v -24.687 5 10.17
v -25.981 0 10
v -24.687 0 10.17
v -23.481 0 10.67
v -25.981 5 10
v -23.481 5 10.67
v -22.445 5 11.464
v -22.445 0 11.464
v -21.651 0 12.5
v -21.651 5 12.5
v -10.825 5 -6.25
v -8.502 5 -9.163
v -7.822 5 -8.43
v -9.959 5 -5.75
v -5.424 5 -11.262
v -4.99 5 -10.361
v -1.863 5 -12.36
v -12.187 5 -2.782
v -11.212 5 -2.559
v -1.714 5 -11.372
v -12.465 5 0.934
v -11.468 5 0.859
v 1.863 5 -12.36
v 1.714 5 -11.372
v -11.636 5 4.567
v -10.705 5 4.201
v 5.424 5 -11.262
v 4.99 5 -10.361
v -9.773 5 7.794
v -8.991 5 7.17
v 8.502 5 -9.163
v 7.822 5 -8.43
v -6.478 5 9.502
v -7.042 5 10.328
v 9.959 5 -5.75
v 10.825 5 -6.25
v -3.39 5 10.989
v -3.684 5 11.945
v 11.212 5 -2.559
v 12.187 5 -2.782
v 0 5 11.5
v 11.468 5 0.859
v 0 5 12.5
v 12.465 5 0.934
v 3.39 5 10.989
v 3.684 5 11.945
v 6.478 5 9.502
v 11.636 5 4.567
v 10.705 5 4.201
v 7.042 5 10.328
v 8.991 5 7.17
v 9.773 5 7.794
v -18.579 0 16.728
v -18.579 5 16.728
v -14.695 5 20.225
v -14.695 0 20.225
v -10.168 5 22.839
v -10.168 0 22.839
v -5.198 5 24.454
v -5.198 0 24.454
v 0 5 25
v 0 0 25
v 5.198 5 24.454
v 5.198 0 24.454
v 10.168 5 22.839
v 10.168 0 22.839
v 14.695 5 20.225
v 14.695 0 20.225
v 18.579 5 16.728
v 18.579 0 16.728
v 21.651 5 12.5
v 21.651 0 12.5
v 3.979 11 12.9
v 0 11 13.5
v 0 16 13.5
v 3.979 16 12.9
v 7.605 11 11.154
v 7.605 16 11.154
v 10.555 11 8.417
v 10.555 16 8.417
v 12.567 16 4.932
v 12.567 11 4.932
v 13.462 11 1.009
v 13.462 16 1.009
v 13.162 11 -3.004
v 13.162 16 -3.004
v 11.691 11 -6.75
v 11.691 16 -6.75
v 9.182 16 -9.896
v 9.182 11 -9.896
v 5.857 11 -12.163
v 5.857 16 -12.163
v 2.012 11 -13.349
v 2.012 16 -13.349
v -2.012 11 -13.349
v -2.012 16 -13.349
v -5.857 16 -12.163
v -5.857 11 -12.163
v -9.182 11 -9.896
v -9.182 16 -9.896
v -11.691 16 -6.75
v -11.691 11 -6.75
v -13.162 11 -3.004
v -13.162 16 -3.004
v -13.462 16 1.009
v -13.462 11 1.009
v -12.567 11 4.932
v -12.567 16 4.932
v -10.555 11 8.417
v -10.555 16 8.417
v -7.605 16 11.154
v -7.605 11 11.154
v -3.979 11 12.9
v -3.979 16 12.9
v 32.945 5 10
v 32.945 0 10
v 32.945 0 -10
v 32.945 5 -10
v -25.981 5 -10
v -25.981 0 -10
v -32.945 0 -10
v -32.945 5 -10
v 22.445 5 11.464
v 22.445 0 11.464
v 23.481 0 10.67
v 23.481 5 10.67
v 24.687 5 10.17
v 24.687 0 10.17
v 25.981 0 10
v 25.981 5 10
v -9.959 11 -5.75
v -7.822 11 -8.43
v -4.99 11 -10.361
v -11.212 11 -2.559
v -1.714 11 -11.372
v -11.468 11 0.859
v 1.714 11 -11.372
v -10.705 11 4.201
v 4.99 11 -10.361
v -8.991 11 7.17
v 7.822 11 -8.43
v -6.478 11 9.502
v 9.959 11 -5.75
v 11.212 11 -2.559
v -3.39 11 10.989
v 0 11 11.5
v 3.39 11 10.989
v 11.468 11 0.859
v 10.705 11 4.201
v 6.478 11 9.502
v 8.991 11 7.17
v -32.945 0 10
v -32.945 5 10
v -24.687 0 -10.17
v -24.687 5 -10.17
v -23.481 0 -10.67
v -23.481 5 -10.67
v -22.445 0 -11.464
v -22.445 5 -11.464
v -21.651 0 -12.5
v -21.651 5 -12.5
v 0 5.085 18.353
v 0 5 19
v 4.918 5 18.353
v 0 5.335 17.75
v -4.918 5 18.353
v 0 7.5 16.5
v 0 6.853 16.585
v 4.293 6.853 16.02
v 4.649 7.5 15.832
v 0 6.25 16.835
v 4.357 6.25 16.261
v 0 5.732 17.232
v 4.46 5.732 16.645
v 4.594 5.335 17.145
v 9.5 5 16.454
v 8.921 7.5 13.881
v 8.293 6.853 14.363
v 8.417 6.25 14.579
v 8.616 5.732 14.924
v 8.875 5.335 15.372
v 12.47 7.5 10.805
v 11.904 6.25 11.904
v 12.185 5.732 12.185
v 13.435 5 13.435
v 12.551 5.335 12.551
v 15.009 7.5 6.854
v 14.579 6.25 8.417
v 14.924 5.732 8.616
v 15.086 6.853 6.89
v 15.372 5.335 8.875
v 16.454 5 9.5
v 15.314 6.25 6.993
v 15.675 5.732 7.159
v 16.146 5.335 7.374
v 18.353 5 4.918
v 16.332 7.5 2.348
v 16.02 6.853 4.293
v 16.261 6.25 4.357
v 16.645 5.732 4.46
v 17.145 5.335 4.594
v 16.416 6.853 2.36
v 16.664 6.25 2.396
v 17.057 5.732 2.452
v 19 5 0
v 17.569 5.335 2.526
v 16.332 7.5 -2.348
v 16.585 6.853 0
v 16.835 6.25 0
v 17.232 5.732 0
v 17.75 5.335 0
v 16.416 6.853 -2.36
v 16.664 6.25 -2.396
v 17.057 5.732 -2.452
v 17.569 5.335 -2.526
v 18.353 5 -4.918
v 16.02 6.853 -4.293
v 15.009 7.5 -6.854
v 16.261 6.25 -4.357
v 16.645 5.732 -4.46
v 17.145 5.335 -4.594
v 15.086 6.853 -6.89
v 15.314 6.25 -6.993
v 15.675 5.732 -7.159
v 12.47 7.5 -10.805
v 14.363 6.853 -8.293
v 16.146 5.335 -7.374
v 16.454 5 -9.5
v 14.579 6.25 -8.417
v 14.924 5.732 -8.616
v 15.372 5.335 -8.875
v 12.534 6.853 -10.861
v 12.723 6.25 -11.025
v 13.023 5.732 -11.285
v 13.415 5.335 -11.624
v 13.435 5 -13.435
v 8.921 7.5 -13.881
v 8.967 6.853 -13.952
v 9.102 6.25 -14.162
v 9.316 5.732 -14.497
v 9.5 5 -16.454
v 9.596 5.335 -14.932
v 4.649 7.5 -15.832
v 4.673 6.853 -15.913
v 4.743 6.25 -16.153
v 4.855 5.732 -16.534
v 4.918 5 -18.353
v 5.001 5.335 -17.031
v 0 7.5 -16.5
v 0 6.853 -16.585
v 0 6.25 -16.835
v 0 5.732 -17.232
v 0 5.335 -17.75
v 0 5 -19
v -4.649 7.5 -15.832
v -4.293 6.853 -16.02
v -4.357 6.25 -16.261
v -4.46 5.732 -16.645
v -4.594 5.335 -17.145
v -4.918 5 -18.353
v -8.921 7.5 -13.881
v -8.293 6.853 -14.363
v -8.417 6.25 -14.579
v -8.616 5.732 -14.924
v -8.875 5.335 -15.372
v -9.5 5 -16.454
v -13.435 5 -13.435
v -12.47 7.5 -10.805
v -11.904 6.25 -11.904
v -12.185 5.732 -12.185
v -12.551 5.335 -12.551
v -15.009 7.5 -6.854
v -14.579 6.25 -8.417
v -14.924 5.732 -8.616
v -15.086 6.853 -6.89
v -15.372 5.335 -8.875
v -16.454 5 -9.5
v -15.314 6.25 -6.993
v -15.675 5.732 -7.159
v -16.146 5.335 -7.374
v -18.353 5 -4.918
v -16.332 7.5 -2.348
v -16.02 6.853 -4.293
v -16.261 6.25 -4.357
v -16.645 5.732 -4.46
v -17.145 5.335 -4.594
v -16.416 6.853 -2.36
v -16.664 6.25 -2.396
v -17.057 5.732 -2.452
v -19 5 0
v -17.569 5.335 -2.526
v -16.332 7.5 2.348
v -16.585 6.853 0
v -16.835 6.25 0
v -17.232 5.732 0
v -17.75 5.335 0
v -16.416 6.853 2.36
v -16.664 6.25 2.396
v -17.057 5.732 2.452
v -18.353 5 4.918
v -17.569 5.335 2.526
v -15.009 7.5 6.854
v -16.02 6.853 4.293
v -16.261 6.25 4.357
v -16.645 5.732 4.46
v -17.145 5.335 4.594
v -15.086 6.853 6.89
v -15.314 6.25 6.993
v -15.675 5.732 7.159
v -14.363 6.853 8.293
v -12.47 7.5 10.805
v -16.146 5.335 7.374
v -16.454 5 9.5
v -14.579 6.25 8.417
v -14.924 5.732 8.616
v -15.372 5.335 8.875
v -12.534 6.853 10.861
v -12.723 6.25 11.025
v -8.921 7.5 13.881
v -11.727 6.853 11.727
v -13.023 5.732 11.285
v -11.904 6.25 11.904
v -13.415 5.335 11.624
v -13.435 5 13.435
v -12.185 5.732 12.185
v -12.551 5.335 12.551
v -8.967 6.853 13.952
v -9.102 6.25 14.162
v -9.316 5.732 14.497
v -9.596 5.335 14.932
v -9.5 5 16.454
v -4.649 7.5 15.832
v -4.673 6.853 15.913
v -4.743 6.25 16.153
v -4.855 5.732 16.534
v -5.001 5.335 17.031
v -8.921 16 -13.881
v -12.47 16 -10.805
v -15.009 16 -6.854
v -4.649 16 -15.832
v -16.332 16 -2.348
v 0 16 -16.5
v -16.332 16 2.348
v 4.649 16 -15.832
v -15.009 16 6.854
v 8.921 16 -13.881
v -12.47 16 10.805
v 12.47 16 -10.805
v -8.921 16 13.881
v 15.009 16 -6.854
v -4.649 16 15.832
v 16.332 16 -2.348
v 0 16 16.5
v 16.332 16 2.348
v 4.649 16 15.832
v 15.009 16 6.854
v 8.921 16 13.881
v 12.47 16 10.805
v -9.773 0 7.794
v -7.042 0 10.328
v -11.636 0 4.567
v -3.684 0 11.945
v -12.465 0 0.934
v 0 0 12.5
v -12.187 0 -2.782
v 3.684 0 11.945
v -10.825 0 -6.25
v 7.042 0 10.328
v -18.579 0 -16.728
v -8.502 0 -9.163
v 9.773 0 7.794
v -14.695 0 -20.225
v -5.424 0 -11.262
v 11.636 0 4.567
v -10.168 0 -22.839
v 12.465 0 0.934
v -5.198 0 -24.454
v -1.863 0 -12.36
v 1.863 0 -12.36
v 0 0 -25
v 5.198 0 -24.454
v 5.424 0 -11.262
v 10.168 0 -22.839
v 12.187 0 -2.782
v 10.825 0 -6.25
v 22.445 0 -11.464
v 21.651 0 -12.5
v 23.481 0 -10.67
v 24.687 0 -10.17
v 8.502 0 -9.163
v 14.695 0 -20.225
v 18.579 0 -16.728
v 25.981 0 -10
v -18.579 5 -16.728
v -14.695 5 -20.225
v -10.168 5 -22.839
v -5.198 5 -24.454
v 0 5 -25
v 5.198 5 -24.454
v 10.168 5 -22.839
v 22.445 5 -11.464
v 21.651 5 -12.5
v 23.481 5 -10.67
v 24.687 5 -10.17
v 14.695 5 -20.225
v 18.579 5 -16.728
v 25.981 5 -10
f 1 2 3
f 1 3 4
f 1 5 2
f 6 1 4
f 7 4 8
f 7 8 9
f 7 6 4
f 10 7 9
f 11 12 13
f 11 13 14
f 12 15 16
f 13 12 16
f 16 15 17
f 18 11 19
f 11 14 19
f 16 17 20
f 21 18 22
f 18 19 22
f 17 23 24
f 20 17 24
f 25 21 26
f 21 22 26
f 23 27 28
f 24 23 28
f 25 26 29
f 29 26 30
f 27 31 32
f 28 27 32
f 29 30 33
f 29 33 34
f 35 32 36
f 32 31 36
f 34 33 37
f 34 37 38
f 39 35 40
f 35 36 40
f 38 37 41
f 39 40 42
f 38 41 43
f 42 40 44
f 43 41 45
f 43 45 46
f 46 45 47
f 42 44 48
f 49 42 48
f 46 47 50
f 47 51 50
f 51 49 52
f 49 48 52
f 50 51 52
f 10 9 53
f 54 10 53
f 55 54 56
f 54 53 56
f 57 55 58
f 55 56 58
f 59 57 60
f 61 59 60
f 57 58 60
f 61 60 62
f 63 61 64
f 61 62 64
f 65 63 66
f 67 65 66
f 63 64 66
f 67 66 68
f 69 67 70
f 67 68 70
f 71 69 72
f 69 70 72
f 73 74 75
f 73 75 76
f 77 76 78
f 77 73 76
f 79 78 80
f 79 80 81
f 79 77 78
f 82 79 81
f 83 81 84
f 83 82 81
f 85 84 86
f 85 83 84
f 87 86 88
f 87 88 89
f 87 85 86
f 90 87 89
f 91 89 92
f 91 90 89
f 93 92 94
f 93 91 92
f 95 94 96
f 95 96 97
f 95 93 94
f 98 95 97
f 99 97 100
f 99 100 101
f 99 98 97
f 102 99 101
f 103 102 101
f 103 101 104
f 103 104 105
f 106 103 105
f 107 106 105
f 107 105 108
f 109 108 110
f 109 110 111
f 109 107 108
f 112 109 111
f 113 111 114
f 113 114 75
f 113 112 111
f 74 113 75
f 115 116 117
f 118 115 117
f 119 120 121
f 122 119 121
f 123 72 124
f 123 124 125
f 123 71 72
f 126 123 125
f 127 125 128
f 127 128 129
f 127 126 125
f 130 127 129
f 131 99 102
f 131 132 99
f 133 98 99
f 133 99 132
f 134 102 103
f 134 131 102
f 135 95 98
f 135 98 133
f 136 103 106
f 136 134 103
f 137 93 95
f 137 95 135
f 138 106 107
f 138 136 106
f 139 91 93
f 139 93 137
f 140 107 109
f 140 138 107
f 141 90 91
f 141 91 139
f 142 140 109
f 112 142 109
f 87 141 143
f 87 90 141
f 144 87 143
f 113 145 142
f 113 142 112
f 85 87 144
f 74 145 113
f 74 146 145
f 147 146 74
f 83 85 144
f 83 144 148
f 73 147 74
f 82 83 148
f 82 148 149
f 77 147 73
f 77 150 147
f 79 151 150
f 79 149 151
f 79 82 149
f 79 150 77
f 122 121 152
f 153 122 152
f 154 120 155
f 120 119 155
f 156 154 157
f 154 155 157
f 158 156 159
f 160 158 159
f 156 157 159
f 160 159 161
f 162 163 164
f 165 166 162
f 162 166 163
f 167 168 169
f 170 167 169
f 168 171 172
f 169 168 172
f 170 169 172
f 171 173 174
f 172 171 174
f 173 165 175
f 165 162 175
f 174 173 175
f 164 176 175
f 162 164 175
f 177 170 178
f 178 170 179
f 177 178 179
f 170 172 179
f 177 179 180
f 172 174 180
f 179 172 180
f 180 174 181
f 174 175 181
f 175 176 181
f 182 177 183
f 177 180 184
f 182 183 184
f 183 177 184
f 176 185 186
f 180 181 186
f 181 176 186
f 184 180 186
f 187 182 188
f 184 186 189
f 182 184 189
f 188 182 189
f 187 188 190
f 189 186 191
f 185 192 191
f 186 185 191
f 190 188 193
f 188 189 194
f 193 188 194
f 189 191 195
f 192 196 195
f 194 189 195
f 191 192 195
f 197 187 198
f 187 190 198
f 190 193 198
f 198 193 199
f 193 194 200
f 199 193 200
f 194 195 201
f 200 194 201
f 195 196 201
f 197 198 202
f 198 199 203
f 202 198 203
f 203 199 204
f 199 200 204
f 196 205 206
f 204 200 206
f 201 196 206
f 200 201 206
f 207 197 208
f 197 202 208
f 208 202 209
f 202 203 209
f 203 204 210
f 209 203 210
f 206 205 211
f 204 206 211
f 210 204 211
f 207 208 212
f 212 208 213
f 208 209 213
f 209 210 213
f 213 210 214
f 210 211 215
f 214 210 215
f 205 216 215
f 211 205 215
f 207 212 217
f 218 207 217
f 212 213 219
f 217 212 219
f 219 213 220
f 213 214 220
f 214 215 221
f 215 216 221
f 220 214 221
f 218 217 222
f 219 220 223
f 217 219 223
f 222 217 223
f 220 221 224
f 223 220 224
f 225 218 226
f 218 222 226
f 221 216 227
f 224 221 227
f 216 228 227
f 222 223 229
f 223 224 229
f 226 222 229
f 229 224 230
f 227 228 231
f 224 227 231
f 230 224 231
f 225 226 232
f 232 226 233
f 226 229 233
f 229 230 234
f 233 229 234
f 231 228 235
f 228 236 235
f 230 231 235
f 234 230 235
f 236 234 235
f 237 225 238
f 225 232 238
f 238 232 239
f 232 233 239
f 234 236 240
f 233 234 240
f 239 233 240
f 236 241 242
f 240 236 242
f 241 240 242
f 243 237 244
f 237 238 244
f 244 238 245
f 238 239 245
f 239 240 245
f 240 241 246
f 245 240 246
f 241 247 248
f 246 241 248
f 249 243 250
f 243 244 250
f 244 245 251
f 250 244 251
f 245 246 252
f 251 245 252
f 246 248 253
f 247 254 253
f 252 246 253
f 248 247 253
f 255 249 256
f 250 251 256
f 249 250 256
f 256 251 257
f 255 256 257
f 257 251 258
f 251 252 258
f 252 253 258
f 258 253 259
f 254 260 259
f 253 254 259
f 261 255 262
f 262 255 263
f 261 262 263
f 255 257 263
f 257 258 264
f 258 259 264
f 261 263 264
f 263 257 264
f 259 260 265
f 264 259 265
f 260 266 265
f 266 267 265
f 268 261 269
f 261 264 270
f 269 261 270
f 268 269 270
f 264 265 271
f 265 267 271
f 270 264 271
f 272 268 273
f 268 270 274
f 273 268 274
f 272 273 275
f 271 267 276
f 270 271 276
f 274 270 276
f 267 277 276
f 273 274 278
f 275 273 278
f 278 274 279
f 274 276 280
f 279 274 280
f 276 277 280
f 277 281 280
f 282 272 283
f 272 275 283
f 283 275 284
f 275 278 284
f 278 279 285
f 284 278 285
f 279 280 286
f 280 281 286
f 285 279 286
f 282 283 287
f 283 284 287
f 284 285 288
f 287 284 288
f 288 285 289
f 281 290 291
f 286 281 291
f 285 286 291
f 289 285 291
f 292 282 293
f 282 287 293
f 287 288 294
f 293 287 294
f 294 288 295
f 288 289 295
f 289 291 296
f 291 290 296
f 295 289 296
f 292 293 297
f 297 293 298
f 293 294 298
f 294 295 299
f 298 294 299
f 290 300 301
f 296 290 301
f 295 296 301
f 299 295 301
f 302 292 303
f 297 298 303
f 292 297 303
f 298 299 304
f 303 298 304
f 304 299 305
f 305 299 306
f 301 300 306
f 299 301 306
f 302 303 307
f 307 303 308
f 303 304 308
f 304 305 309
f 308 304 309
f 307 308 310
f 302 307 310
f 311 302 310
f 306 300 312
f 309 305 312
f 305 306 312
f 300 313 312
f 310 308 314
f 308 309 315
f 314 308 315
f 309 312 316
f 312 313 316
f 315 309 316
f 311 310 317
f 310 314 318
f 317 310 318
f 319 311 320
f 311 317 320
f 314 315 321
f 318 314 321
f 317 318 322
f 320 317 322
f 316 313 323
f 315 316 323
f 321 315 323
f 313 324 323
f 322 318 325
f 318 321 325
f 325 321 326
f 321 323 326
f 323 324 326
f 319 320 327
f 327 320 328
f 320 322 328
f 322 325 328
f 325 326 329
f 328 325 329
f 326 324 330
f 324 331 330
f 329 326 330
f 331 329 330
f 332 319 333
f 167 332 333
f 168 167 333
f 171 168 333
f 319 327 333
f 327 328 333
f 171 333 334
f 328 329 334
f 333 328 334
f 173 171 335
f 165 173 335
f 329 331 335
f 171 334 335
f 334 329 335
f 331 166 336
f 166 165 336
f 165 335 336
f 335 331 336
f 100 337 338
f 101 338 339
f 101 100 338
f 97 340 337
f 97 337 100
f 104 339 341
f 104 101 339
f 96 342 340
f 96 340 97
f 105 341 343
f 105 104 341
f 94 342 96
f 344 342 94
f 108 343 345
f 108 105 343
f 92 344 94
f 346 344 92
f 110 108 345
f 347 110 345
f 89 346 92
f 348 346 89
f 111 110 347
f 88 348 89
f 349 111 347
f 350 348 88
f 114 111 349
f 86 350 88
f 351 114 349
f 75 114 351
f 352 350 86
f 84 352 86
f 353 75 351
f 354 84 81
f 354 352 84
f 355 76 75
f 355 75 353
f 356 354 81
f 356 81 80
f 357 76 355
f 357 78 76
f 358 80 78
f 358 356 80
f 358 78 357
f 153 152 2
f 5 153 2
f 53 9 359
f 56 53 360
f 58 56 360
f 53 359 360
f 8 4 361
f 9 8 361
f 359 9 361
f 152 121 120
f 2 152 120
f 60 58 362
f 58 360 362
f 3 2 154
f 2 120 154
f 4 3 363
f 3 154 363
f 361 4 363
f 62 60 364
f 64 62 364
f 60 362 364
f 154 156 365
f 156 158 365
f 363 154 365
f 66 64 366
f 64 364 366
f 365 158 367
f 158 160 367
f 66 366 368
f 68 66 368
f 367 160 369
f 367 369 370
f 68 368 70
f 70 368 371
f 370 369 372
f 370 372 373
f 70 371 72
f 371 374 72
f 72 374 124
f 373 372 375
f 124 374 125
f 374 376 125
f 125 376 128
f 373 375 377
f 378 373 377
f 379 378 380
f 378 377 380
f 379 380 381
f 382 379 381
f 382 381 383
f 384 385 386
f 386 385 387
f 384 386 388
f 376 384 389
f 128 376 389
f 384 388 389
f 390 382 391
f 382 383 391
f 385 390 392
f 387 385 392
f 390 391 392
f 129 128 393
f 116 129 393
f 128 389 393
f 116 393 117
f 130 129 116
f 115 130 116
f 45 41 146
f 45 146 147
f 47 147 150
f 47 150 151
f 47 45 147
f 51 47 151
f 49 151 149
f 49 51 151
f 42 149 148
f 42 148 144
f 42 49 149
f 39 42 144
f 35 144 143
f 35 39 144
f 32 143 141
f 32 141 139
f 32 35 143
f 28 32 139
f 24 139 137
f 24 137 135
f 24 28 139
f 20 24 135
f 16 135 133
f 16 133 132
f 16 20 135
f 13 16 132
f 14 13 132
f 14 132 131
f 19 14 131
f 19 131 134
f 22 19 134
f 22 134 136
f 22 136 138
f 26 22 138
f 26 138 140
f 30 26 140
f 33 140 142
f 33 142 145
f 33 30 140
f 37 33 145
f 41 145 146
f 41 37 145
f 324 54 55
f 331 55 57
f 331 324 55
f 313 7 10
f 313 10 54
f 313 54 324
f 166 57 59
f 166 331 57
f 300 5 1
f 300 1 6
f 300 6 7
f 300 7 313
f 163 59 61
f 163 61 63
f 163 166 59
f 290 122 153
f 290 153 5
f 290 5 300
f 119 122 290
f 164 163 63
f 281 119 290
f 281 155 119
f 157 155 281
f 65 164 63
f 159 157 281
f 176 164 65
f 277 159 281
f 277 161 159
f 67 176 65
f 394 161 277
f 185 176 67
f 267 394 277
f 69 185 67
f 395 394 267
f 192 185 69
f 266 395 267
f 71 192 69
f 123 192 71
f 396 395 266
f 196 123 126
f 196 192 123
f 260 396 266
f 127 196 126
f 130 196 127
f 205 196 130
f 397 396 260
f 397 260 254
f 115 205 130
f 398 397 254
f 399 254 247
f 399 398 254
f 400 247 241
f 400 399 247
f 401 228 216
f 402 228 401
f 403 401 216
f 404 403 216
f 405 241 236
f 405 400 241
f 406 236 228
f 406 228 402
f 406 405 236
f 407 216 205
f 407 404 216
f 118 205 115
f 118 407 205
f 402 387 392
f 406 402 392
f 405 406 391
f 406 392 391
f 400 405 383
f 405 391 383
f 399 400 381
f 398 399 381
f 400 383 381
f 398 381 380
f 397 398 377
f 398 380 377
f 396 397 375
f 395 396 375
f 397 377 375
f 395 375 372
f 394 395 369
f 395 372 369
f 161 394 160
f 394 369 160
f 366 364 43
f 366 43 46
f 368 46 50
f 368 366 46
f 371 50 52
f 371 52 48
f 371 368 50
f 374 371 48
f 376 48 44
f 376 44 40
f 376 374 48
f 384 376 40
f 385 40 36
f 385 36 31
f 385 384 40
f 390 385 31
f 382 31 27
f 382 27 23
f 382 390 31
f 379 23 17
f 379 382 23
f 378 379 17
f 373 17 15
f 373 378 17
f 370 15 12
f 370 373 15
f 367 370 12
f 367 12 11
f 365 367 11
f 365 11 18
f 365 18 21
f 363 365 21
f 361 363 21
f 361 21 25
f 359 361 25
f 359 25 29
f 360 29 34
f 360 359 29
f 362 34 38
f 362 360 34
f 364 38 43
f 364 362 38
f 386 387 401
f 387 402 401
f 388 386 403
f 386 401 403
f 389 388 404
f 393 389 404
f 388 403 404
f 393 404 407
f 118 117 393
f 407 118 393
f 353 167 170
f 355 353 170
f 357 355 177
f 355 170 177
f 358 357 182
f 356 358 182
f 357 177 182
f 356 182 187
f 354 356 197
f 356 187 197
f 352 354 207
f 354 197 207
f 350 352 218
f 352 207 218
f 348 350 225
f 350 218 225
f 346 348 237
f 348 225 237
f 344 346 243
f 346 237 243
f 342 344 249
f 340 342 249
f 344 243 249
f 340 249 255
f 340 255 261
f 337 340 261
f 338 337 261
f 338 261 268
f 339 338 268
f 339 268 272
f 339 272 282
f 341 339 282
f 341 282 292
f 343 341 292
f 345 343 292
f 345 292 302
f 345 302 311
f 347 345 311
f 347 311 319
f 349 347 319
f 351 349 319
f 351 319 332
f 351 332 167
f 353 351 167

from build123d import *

# Parameters (mm, degrees)
SKETCH1_R           = 12.5
BOSS_EXTRUDE1_DEPTH = 5
SKETCH2_R           = 16.5
SKETCH2_R_2         = 11.5
BOSS_EXTRUDE2_DEPTH = 6
SKETCH3_R           = 16.5
SKETCH3_R_2         = 13.5
BOSS_EXTRUDE3_DEPTH = 5
FILLET1_R           = 2.5
FILLET2_R           = 5


with BuildPart() as part:
    # Sketch1 → Boss-Extrude1 (new body)
    with BuildSketch(Plane(origin=(0, 0, 0), x_dir=(1, 0, 0), z_dir=(0, 1, 0))):
        with BuildLine():
            Line((-22.912878475, 10), (-32.945, 10))
            Line((-32.945, 10), (-32.945, -10))
            Line((-32.945, -10), (-22.912878475, -10))
            ThreePointArc((-22.912878475, -10), (0, -25), (22.912878475, -10))
            Line((22.912878475, -10), (32.945, -10))
            Line((32.945, -10), (32.945, 10))
            Line((32.945, 10), (22.912878475, 10))
            ThreePointArc((22.912878475, 10), (0, 25), (-22.912878475, 10))
        make_face()
        with Locations(Location((0, 0, 0), (0, 0, 270))):
            Circle(SKETCH1_R, mode=Mode.SUBTRACT)
    extrude(amount=BOSS_EXTRUDE1_DEPTH)

    # Sketch2 → Boss-Extrude2 (add)
    with BuildSketch(Plane(origin=(0, 5, 0), x_dir=(1, 0, 0), z_dir=(0, 1, 0))):
        with Locations(Location((0, 0, 0), (0, 0, 270))):
            Circle(SKETCH2_R)
        with Locations(Location((0, 0, 0), (0, 0, 270))):
            Circle(SKETCH2_R_2, mode=Mode.SUBTRACT)
    extrude(amount=BOSS_EXTRUDE2_DEPTH)

    # Sketch3 → Boss-Extrude3 (add)
    with BuildSketch(Plane(origin=(0, 11, 0), x_dir=(1, 0, 0), z_dir=(0, 1, 0))):
        with Locations(Location((0, 0, 0), (0, 0, 270))):
            Circle(SKETCH3_R)
        with Locations(Location((0, 0, 0), (0, 0, 270))):
            Circle(SKETCH3_R_2, mode=Mode.SUBTRACT)
    extrude(amount=BOSS_EXTRUDE3_DEPTH)

    # Fillet1
    fillet1_edges = [part.edges().sort_by_distance(p)[0] for p in [
        (0, 5, -16.5),
    ]]
    fillet(fillet1_edges, radius=FILLET1_R)

    # Fillet2
    fillet2_edges = [part.edges().sort_by_distance(p)[0] for p in [
        (-22.912878475, 2.5, -10),
        (22.912878475, 2.5, -10),
        (22.912878475, 2.5, 10),
        (-22.912878475, 2.5, 10),
    ]]
    fillet(fillet2_edges, radius=FILLET2_R)


solid = part.part
